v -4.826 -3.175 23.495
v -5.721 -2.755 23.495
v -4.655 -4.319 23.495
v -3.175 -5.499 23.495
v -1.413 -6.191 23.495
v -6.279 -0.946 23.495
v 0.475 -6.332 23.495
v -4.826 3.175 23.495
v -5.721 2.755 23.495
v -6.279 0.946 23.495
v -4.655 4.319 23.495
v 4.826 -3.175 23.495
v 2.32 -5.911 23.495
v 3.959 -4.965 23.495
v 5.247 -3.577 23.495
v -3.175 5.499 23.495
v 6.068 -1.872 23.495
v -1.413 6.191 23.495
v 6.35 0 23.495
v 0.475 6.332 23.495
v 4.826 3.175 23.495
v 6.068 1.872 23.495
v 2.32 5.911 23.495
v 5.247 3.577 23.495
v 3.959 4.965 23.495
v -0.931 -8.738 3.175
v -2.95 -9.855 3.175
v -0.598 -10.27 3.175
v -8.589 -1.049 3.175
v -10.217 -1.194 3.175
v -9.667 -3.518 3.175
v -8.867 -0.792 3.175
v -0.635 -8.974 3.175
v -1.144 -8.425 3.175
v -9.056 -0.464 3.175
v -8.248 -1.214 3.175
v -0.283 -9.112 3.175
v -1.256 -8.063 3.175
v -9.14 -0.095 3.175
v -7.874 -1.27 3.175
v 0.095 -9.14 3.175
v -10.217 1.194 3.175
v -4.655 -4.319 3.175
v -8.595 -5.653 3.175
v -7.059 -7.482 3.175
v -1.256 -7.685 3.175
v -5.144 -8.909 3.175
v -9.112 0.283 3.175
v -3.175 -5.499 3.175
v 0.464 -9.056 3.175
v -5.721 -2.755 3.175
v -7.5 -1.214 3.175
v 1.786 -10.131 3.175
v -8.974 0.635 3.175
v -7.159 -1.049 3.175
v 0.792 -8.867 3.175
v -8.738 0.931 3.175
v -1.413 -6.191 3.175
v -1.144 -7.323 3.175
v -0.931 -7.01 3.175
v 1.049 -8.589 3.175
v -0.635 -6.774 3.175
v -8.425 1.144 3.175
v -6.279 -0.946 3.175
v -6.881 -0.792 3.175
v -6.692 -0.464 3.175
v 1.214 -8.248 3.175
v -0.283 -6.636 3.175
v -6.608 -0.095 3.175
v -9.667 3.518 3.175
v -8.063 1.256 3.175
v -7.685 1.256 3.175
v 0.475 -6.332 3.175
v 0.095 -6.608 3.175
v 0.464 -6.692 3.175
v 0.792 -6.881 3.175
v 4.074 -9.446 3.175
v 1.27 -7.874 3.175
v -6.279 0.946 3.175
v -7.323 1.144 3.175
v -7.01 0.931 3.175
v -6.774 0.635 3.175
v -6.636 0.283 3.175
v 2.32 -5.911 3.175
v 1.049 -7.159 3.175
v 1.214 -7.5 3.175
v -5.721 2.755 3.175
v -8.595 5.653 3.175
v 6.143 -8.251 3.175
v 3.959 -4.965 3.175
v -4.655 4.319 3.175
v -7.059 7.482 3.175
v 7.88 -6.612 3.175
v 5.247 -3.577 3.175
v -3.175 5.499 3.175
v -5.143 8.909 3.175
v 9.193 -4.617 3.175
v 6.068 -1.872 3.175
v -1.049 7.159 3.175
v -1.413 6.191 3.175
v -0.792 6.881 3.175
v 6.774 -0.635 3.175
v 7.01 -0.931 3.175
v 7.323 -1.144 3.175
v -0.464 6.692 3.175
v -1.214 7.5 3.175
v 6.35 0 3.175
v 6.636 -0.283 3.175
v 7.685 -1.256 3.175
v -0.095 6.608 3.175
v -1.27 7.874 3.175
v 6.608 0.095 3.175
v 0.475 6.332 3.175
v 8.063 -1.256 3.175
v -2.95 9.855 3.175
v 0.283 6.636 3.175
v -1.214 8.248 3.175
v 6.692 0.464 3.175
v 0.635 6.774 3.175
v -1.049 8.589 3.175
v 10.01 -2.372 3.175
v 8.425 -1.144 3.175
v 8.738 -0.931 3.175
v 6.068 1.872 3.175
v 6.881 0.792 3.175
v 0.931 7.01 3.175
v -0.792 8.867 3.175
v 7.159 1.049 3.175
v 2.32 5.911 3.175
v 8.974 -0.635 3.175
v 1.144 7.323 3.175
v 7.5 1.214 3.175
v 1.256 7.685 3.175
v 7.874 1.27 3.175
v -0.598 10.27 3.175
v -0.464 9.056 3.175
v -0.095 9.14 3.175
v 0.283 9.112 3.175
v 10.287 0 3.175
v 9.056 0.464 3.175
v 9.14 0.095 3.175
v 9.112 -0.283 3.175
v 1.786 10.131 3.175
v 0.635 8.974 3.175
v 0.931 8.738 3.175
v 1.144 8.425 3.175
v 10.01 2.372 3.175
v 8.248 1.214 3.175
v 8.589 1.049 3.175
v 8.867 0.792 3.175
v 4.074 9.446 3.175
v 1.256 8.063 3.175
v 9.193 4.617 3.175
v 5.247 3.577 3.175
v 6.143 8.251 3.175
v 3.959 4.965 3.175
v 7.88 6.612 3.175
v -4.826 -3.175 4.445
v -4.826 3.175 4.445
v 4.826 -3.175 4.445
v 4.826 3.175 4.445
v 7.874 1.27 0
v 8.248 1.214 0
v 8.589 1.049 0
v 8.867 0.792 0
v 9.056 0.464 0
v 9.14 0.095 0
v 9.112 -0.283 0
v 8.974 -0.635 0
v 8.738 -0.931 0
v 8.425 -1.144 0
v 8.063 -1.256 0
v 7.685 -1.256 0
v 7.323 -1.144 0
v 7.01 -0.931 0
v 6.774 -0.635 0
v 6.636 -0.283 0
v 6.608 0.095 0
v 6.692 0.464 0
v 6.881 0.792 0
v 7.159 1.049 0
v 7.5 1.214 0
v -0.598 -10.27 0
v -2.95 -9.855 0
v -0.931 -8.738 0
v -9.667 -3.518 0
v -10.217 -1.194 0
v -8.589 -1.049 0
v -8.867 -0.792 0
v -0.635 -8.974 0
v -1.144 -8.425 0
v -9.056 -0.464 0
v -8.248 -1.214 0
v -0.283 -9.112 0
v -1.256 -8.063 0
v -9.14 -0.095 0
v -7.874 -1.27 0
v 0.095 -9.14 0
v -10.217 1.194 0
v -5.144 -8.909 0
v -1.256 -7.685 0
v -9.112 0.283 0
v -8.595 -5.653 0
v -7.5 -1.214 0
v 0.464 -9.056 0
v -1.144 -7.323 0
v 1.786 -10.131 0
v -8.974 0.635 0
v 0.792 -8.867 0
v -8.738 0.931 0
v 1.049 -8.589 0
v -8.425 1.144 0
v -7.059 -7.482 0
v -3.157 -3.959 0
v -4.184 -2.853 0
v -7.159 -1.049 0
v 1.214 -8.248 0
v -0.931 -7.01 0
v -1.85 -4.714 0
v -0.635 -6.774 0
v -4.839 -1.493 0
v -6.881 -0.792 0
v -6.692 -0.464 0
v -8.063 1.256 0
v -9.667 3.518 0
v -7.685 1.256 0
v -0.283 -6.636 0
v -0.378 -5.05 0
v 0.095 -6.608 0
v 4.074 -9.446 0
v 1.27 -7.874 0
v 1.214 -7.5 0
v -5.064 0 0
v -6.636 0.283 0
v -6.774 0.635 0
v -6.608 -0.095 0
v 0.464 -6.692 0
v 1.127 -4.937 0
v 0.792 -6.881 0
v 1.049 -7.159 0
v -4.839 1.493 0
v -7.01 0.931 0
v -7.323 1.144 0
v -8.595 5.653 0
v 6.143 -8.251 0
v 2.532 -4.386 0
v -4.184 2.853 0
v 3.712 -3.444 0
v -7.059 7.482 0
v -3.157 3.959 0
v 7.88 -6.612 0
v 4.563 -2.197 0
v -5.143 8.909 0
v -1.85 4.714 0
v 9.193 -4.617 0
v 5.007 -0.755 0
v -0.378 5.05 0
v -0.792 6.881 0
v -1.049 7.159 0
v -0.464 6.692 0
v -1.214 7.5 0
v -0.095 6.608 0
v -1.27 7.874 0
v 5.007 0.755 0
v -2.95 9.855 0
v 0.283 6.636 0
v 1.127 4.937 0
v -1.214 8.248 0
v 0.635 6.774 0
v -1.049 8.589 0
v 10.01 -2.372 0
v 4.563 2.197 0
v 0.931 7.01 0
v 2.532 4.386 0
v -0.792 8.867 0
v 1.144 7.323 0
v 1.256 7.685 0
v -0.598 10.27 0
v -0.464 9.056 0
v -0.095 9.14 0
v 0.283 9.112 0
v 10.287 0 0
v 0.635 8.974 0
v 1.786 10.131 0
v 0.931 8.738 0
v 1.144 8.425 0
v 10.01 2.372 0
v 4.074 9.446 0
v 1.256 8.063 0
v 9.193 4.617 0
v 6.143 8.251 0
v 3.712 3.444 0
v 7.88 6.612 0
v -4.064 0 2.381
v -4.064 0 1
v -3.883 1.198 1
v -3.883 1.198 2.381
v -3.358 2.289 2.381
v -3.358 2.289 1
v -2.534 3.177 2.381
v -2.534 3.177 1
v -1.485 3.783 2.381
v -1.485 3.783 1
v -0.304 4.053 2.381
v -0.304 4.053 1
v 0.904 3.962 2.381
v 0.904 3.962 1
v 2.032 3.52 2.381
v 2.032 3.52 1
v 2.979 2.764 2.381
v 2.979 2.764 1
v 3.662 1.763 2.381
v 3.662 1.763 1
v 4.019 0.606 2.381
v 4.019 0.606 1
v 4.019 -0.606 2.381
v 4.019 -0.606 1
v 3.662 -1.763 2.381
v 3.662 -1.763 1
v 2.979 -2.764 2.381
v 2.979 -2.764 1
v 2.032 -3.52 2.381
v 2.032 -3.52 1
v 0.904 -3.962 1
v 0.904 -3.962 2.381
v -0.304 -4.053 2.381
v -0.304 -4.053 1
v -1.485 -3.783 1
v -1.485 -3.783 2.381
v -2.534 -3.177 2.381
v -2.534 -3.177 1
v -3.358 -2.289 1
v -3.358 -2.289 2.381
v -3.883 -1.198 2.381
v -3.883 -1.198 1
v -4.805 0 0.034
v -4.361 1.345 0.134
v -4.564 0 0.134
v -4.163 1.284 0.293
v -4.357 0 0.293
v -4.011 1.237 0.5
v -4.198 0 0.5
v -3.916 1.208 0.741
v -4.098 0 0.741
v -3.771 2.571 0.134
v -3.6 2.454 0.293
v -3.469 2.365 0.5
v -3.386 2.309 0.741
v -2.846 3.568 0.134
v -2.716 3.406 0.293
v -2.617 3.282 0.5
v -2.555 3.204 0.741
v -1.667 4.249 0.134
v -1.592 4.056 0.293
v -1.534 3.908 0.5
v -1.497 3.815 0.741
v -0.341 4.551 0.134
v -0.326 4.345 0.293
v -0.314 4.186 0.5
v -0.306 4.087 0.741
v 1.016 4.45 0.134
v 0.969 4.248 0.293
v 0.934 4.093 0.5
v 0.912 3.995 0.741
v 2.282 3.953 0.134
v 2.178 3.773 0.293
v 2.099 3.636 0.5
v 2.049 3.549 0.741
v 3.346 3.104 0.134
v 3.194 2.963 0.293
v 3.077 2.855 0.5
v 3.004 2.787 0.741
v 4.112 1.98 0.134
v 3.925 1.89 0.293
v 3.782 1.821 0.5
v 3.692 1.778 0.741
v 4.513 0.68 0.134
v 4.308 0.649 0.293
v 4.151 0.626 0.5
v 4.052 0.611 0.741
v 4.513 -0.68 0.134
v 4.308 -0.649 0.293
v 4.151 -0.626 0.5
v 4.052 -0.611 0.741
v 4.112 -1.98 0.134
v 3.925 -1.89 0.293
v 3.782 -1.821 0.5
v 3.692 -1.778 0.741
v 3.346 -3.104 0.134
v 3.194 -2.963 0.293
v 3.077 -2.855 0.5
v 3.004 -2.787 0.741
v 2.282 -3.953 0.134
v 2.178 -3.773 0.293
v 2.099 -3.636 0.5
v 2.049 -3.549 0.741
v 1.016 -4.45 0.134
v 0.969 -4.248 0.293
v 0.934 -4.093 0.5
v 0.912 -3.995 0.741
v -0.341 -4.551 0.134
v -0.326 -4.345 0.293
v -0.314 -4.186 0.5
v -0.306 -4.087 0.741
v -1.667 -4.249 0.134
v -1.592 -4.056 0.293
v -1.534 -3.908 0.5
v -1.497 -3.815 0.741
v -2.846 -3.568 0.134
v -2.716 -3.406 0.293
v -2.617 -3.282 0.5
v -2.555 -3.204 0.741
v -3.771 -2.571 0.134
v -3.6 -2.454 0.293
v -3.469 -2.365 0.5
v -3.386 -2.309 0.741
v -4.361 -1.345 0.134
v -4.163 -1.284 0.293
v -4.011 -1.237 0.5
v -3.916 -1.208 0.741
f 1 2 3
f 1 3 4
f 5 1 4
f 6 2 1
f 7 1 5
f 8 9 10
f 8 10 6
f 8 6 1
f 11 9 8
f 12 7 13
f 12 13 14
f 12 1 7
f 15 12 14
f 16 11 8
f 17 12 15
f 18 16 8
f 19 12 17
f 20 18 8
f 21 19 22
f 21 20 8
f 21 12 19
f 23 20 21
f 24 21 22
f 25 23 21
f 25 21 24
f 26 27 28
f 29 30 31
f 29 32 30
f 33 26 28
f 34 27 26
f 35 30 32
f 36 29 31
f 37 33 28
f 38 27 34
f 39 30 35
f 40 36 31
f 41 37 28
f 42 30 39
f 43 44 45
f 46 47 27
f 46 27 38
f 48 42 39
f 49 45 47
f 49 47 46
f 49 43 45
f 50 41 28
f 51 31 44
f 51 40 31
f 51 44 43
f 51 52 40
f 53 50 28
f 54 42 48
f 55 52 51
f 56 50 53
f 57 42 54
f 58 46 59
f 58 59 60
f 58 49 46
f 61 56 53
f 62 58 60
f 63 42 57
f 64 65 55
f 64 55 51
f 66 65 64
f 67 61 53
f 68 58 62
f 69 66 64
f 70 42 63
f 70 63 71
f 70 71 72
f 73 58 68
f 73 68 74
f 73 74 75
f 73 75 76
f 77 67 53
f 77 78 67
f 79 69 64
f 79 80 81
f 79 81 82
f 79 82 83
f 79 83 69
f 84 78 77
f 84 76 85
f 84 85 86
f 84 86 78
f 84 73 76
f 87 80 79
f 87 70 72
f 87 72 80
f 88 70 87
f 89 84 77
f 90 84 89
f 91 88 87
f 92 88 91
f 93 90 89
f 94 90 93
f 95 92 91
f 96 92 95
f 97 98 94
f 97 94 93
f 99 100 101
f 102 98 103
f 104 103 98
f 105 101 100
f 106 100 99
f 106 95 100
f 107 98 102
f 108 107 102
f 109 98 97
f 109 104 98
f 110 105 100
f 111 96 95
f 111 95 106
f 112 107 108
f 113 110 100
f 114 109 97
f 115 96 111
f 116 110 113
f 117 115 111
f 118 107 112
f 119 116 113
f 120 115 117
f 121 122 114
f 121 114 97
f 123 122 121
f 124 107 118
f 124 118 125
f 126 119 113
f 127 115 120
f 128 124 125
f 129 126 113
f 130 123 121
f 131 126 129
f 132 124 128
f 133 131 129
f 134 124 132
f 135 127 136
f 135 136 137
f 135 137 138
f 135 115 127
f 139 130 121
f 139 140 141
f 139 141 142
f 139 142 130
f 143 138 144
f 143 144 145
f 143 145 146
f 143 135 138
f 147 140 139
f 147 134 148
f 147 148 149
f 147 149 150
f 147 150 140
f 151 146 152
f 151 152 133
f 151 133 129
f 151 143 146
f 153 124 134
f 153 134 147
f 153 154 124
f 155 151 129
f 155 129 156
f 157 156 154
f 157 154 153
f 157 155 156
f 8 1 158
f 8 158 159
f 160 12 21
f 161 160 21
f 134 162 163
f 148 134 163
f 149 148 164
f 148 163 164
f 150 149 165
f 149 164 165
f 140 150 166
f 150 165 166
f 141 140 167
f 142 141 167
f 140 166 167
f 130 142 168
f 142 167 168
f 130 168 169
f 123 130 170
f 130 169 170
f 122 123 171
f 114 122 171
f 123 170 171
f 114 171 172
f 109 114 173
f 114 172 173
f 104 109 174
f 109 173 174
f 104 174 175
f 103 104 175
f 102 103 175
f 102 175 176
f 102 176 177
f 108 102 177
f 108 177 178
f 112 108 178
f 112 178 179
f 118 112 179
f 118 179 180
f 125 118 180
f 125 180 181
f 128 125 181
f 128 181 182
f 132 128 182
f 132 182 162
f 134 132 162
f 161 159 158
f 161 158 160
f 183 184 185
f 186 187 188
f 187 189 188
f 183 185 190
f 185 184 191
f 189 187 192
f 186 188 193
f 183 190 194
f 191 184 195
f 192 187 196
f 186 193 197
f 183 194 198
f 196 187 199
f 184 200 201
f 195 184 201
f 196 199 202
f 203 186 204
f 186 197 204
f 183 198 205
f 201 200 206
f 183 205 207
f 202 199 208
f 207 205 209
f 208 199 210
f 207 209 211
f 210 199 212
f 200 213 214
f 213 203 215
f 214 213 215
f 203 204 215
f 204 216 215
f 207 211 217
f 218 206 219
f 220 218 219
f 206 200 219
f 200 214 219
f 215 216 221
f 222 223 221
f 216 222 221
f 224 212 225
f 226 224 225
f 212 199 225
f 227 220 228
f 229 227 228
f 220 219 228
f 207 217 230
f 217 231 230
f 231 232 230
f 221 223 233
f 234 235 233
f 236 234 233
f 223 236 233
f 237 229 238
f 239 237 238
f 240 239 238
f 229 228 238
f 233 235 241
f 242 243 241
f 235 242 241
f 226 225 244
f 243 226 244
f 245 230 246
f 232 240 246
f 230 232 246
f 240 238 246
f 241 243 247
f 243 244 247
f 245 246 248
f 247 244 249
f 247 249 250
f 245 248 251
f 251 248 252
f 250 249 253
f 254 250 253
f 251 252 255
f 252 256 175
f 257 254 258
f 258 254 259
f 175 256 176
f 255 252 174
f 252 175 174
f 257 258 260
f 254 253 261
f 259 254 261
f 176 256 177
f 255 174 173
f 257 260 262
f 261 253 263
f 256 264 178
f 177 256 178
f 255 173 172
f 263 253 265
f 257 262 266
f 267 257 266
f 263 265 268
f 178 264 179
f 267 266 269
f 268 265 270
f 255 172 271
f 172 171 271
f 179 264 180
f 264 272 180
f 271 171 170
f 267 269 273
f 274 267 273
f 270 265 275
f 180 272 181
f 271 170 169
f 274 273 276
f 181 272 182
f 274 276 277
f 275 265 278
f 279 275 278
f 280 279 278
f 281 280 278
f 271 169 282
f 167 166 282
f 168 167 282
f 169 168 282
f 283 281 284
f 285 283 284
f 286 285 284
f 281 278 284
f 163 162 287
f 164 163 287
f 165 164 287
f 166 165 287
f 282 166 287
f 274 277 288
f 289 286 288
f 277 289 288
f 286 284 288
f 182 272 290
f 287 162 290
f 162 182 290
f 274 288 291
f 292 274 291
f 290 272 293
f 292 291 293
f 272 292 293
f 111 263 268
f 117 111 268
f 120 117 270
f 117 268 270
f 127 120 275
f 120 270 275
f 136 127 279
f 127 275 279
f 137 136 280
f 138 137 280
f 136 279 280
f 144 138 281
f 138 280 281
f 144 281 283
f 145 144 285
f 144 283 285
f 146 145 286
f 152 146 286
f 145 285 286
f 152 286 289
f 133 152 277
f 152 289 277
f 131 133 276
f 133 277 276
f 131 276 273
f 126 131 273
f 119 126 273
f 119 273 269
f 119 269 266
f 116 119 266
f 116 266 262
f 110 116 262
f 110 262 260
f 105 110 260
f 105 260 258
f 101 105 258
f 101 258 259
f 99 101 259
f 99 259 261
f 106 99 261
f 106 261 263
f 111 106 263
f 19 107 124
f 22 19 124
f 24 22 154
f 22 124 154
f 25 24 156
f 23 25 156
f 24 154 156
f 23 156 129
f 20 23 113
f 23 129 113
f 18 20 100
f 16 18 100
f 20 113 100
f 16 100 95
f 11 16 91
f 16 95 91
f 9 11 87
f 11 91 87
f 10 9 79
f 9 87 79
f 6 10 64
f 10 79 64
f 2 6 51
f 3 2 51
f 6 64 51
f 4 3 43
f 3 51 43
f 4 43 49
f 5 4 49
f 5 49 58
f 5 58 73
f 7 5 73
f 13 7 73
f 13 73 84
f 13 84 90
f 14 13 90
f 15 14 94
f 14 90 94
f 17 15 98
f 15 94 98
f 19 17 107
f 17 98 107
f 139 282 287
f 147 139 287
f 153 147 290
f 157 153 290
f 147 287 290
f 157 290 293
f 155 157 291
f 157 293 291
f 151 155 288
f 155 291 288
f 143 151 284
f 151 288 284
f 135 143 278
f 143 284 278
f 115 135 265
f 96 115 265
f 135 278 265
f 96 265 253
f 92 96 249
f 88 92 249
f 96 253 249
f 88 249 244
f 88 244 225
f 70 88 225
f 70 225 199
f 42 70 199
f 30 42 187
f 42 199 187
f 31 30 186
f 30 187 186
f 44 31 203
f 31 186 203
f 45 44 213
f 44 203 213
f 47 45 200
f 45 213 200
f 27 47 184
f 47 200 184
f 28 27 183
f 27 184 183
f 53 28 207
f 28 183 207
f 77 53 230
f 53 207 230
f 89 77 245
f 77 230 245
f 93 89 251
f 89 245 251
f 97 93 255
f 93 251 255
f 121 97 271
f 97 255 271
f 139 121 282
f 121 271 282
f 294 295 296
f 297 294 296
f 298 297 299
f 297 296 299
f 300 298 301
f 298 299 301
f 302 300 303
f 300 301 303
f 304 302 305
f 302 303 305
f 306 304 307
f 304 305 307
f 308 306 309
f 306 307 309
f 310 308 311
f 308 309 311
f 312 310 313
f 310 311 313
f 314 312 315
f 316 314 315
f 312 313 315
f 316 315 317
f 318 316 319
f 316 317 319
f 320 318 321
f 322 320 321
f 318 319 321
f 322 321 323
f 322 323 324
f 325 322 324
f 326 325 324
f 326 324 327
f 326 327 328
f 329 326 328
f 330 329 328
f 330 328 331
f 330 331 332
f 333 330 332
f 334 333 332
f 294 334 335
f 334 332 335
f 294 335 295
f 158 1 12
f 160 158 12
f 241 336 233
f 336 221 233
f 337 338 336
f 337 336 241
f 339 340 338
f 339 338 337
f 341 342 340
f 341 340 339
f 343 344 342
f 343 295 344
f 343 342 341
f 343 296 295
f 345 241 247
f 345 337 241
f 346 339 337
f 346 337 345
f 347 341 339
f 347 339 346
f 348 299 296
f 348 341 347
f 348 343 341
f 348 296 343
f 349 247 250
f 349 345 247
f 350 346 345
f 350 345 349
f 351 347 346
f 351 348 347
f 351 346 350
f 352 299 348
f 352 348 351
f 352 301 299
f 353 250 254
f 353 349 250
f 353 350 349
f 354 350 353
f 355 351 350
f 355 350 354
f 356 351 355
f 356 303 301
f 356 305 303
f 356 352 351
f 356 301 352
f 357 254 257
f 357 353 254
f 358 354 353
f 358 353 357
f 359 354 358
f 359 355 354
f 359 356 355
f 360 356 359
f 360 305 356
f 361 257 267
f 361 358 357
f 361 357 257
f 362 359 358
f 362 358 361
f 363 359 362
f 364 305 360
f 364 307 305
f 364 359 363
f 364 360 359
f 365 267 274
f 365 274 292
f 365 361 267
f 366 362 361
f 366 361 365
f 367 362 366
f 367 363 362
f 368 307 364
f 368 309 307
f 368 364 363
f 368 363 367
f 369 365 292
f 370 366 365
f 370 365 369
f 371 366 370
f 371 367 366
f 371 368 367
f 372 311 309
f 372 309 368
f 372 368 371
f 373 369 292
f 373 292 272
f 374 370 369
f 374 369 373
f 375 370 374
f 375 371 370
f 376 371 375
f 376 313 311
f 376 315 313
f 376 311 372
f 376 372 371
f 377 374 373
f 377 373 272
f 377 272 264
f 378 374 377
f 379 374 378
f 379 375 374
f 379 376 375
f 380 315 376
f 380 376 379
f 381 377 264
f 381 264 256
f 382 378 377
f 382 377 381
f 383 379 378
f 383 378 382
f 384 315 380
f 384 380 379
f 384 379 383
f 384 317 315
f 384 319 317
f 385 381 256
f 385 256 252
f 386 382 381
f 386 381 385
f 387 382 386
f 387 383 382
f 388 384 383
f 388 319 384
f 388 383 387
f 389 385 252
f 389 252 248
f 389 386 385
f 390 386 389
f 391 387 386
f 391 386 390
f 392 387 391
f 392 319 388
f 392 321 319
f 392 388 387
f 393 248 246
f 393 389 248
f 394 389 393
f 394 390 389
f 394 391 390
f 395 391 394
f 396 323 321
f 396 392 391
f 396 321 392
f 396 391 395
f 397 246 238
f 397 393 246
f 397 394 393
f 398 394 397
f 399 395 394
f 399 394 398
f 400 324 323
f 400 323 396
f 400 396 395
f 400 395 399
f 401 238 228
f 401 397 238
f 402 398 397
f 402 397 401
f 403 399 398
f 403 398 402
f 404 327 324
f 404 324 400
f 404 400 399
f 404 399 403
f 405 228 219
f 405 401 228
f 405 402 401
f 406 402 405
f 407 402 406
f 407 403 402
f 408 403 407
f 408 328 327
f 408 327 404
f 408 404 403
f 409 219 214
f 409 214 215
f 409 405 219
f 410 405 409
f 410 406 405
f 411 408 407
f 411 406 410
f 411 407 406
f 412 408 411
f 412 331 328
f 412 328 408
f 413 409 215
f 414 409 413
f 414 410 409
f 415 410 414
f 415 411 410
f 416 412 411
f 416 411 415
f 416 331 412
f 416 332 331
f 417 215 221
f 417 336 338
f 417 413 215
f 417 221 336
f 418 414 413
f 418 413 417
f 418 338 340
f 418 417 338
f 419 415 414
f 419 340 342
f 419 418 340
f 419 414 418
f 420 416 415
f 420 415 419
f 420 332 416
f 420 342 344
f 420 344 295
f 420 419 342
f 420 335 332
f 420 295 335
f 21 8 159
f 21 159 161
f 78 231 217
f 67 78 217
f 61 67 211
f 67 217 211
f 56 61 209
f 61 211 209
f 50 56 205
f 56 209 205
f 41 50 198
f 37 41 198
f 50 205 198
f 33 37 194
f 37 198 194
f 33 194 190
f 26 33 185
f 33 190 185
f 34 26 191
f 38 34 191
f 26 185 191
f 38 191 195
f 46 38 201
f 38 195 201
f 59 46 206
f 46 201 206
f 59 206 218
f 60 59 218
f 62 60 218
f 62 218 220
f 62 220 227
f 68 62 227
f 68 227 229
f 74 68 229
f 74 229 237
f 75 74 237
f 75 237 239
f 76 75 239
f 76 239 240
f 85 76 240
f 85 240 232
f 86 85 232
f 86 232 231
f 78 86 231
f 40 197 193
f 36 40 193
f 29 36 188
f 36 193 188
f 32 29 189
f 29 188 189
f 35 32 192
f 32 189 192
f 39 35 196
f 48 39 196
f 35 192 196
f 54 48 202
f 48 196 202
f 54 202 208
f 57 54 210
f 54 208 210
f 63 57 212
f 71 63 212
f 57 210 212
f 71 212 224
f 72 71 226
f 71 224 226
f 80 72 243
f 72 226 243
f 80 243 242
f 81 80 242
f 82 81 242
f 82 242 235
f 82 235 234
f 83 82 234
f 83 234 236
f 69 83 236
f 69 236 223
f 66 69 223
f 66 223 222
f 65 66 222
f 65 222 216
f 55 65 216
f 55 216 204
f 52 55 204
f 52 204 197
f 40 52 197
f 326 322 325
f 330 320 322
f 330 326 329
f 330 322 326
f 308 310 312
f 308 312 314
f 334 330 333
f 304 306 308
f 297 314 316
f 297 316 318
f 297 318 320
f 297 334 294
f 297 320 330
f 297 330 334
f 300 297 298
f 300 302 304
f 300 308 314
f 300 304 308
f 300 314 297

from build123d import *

# Parameters (mm, degrees)
SKETCH1_R           = 10.287
BOSS_EXTRUDE1_DEPTH = 3.175
SKETCH3_R           = 4.064
CUT_EXTRUDE1_DEPTH  = 2.38125
FILLET1_R           = 1.000000032
CUT_EXTRUDE2_REACH  = 16.89
SKETCH4_R           = 1.27
CIRPATTERN1_COUNT   = 4
SKETCH5_R           = 6.35
BOSS_EXTRUDE2_DEPTH = 20.32
SKETCH6_W           = 9.652
SKETCH6_H           = 6.35
CUT_EXTRUDE3_DEPTH  = 19.05


with BuildPart() as part:
    # Sketch1 → Boss-Extrude1 (new body)
    with BuildSketch(Plane.XY):
        Circle(SKETCH1_R)
    extrude(amount=BOSS_EXTRUDE1_DEPTH)

    # Sketch3 → Cut-Extrude1 (cut)
    with BuildSketch(Plane(origin=(0, 0, 0), x_dir=(-1, 0, 0), z_dir=(0, 0, -1))):
        Circle(SKETCH3_R)
    extrude(amount=-CUT_EXTRUDE1_DEPTH, mode=Mode.SUBTRACT)

    # Fillet1
    fillet1_edges = [part.edges().sort_by_distance(p)[0] for p in [
        (4.064, 0, 0),
    ]]
    fillet(fillet1_edges, radius=FILLET1_R)

    # Sketch4 → Cut-Extrude2 (cut, up to next)
    with BuildSketch(Plane(origin=(0, 0, 0), x_dir=(-1, 0, 0), z_dir=(0, 0, -1)), mode=Mode.PRIVATE) as cut_extrude2_sk1:
        with Locations((0, 7.874)):
            Circle(SKETCH4_R)
    cut_extrude2_tool1 = extrude(cut_extrude2_sk1.sketch, amount=-CUT_EXTRUDE2_REACH, mode=Mode.PRIVATE) & part.part
    cut_extrude2 = cut_extrude2_tool1.solids().sort_by_distance((0, 7.874, 0))[0]
    add(cut_extrude2, mode=Mode.SUBTRACT)

    # CirPattern1: Cut-Extrude2 ×4 about axis
    cirpattern1_axis = Axis((0, 0, 0), (0, 0, 1))
    for i in range(1, CIRPATTERN1_COUNT):
        add(cut_extrude2.rotate(cirpattern1_axis, i * 360 / CIRPATTERN1_COUNT), mode=Mode.SUBTRACT)

    # Sketch5 → Boss-Extrude2 (add)
    with BuildSketch(Plane.XY.offset(3.175)):
        Circle(SKETCH5_R)
    extrude(amount=BOSS_EXTRUDE2_DEPTH)

    # Sketch6 → Cut-Extrude3 (cut)
    with BuildSketch(Plane.XY.offset(23.495)):
        Rectangle(SKETCH6_W, SKETCH6_H)
    extrude(amount=-CUT_EXTRUDE3_DEPTH, mode=Mode.SUBTRACT)


solid = part.part
